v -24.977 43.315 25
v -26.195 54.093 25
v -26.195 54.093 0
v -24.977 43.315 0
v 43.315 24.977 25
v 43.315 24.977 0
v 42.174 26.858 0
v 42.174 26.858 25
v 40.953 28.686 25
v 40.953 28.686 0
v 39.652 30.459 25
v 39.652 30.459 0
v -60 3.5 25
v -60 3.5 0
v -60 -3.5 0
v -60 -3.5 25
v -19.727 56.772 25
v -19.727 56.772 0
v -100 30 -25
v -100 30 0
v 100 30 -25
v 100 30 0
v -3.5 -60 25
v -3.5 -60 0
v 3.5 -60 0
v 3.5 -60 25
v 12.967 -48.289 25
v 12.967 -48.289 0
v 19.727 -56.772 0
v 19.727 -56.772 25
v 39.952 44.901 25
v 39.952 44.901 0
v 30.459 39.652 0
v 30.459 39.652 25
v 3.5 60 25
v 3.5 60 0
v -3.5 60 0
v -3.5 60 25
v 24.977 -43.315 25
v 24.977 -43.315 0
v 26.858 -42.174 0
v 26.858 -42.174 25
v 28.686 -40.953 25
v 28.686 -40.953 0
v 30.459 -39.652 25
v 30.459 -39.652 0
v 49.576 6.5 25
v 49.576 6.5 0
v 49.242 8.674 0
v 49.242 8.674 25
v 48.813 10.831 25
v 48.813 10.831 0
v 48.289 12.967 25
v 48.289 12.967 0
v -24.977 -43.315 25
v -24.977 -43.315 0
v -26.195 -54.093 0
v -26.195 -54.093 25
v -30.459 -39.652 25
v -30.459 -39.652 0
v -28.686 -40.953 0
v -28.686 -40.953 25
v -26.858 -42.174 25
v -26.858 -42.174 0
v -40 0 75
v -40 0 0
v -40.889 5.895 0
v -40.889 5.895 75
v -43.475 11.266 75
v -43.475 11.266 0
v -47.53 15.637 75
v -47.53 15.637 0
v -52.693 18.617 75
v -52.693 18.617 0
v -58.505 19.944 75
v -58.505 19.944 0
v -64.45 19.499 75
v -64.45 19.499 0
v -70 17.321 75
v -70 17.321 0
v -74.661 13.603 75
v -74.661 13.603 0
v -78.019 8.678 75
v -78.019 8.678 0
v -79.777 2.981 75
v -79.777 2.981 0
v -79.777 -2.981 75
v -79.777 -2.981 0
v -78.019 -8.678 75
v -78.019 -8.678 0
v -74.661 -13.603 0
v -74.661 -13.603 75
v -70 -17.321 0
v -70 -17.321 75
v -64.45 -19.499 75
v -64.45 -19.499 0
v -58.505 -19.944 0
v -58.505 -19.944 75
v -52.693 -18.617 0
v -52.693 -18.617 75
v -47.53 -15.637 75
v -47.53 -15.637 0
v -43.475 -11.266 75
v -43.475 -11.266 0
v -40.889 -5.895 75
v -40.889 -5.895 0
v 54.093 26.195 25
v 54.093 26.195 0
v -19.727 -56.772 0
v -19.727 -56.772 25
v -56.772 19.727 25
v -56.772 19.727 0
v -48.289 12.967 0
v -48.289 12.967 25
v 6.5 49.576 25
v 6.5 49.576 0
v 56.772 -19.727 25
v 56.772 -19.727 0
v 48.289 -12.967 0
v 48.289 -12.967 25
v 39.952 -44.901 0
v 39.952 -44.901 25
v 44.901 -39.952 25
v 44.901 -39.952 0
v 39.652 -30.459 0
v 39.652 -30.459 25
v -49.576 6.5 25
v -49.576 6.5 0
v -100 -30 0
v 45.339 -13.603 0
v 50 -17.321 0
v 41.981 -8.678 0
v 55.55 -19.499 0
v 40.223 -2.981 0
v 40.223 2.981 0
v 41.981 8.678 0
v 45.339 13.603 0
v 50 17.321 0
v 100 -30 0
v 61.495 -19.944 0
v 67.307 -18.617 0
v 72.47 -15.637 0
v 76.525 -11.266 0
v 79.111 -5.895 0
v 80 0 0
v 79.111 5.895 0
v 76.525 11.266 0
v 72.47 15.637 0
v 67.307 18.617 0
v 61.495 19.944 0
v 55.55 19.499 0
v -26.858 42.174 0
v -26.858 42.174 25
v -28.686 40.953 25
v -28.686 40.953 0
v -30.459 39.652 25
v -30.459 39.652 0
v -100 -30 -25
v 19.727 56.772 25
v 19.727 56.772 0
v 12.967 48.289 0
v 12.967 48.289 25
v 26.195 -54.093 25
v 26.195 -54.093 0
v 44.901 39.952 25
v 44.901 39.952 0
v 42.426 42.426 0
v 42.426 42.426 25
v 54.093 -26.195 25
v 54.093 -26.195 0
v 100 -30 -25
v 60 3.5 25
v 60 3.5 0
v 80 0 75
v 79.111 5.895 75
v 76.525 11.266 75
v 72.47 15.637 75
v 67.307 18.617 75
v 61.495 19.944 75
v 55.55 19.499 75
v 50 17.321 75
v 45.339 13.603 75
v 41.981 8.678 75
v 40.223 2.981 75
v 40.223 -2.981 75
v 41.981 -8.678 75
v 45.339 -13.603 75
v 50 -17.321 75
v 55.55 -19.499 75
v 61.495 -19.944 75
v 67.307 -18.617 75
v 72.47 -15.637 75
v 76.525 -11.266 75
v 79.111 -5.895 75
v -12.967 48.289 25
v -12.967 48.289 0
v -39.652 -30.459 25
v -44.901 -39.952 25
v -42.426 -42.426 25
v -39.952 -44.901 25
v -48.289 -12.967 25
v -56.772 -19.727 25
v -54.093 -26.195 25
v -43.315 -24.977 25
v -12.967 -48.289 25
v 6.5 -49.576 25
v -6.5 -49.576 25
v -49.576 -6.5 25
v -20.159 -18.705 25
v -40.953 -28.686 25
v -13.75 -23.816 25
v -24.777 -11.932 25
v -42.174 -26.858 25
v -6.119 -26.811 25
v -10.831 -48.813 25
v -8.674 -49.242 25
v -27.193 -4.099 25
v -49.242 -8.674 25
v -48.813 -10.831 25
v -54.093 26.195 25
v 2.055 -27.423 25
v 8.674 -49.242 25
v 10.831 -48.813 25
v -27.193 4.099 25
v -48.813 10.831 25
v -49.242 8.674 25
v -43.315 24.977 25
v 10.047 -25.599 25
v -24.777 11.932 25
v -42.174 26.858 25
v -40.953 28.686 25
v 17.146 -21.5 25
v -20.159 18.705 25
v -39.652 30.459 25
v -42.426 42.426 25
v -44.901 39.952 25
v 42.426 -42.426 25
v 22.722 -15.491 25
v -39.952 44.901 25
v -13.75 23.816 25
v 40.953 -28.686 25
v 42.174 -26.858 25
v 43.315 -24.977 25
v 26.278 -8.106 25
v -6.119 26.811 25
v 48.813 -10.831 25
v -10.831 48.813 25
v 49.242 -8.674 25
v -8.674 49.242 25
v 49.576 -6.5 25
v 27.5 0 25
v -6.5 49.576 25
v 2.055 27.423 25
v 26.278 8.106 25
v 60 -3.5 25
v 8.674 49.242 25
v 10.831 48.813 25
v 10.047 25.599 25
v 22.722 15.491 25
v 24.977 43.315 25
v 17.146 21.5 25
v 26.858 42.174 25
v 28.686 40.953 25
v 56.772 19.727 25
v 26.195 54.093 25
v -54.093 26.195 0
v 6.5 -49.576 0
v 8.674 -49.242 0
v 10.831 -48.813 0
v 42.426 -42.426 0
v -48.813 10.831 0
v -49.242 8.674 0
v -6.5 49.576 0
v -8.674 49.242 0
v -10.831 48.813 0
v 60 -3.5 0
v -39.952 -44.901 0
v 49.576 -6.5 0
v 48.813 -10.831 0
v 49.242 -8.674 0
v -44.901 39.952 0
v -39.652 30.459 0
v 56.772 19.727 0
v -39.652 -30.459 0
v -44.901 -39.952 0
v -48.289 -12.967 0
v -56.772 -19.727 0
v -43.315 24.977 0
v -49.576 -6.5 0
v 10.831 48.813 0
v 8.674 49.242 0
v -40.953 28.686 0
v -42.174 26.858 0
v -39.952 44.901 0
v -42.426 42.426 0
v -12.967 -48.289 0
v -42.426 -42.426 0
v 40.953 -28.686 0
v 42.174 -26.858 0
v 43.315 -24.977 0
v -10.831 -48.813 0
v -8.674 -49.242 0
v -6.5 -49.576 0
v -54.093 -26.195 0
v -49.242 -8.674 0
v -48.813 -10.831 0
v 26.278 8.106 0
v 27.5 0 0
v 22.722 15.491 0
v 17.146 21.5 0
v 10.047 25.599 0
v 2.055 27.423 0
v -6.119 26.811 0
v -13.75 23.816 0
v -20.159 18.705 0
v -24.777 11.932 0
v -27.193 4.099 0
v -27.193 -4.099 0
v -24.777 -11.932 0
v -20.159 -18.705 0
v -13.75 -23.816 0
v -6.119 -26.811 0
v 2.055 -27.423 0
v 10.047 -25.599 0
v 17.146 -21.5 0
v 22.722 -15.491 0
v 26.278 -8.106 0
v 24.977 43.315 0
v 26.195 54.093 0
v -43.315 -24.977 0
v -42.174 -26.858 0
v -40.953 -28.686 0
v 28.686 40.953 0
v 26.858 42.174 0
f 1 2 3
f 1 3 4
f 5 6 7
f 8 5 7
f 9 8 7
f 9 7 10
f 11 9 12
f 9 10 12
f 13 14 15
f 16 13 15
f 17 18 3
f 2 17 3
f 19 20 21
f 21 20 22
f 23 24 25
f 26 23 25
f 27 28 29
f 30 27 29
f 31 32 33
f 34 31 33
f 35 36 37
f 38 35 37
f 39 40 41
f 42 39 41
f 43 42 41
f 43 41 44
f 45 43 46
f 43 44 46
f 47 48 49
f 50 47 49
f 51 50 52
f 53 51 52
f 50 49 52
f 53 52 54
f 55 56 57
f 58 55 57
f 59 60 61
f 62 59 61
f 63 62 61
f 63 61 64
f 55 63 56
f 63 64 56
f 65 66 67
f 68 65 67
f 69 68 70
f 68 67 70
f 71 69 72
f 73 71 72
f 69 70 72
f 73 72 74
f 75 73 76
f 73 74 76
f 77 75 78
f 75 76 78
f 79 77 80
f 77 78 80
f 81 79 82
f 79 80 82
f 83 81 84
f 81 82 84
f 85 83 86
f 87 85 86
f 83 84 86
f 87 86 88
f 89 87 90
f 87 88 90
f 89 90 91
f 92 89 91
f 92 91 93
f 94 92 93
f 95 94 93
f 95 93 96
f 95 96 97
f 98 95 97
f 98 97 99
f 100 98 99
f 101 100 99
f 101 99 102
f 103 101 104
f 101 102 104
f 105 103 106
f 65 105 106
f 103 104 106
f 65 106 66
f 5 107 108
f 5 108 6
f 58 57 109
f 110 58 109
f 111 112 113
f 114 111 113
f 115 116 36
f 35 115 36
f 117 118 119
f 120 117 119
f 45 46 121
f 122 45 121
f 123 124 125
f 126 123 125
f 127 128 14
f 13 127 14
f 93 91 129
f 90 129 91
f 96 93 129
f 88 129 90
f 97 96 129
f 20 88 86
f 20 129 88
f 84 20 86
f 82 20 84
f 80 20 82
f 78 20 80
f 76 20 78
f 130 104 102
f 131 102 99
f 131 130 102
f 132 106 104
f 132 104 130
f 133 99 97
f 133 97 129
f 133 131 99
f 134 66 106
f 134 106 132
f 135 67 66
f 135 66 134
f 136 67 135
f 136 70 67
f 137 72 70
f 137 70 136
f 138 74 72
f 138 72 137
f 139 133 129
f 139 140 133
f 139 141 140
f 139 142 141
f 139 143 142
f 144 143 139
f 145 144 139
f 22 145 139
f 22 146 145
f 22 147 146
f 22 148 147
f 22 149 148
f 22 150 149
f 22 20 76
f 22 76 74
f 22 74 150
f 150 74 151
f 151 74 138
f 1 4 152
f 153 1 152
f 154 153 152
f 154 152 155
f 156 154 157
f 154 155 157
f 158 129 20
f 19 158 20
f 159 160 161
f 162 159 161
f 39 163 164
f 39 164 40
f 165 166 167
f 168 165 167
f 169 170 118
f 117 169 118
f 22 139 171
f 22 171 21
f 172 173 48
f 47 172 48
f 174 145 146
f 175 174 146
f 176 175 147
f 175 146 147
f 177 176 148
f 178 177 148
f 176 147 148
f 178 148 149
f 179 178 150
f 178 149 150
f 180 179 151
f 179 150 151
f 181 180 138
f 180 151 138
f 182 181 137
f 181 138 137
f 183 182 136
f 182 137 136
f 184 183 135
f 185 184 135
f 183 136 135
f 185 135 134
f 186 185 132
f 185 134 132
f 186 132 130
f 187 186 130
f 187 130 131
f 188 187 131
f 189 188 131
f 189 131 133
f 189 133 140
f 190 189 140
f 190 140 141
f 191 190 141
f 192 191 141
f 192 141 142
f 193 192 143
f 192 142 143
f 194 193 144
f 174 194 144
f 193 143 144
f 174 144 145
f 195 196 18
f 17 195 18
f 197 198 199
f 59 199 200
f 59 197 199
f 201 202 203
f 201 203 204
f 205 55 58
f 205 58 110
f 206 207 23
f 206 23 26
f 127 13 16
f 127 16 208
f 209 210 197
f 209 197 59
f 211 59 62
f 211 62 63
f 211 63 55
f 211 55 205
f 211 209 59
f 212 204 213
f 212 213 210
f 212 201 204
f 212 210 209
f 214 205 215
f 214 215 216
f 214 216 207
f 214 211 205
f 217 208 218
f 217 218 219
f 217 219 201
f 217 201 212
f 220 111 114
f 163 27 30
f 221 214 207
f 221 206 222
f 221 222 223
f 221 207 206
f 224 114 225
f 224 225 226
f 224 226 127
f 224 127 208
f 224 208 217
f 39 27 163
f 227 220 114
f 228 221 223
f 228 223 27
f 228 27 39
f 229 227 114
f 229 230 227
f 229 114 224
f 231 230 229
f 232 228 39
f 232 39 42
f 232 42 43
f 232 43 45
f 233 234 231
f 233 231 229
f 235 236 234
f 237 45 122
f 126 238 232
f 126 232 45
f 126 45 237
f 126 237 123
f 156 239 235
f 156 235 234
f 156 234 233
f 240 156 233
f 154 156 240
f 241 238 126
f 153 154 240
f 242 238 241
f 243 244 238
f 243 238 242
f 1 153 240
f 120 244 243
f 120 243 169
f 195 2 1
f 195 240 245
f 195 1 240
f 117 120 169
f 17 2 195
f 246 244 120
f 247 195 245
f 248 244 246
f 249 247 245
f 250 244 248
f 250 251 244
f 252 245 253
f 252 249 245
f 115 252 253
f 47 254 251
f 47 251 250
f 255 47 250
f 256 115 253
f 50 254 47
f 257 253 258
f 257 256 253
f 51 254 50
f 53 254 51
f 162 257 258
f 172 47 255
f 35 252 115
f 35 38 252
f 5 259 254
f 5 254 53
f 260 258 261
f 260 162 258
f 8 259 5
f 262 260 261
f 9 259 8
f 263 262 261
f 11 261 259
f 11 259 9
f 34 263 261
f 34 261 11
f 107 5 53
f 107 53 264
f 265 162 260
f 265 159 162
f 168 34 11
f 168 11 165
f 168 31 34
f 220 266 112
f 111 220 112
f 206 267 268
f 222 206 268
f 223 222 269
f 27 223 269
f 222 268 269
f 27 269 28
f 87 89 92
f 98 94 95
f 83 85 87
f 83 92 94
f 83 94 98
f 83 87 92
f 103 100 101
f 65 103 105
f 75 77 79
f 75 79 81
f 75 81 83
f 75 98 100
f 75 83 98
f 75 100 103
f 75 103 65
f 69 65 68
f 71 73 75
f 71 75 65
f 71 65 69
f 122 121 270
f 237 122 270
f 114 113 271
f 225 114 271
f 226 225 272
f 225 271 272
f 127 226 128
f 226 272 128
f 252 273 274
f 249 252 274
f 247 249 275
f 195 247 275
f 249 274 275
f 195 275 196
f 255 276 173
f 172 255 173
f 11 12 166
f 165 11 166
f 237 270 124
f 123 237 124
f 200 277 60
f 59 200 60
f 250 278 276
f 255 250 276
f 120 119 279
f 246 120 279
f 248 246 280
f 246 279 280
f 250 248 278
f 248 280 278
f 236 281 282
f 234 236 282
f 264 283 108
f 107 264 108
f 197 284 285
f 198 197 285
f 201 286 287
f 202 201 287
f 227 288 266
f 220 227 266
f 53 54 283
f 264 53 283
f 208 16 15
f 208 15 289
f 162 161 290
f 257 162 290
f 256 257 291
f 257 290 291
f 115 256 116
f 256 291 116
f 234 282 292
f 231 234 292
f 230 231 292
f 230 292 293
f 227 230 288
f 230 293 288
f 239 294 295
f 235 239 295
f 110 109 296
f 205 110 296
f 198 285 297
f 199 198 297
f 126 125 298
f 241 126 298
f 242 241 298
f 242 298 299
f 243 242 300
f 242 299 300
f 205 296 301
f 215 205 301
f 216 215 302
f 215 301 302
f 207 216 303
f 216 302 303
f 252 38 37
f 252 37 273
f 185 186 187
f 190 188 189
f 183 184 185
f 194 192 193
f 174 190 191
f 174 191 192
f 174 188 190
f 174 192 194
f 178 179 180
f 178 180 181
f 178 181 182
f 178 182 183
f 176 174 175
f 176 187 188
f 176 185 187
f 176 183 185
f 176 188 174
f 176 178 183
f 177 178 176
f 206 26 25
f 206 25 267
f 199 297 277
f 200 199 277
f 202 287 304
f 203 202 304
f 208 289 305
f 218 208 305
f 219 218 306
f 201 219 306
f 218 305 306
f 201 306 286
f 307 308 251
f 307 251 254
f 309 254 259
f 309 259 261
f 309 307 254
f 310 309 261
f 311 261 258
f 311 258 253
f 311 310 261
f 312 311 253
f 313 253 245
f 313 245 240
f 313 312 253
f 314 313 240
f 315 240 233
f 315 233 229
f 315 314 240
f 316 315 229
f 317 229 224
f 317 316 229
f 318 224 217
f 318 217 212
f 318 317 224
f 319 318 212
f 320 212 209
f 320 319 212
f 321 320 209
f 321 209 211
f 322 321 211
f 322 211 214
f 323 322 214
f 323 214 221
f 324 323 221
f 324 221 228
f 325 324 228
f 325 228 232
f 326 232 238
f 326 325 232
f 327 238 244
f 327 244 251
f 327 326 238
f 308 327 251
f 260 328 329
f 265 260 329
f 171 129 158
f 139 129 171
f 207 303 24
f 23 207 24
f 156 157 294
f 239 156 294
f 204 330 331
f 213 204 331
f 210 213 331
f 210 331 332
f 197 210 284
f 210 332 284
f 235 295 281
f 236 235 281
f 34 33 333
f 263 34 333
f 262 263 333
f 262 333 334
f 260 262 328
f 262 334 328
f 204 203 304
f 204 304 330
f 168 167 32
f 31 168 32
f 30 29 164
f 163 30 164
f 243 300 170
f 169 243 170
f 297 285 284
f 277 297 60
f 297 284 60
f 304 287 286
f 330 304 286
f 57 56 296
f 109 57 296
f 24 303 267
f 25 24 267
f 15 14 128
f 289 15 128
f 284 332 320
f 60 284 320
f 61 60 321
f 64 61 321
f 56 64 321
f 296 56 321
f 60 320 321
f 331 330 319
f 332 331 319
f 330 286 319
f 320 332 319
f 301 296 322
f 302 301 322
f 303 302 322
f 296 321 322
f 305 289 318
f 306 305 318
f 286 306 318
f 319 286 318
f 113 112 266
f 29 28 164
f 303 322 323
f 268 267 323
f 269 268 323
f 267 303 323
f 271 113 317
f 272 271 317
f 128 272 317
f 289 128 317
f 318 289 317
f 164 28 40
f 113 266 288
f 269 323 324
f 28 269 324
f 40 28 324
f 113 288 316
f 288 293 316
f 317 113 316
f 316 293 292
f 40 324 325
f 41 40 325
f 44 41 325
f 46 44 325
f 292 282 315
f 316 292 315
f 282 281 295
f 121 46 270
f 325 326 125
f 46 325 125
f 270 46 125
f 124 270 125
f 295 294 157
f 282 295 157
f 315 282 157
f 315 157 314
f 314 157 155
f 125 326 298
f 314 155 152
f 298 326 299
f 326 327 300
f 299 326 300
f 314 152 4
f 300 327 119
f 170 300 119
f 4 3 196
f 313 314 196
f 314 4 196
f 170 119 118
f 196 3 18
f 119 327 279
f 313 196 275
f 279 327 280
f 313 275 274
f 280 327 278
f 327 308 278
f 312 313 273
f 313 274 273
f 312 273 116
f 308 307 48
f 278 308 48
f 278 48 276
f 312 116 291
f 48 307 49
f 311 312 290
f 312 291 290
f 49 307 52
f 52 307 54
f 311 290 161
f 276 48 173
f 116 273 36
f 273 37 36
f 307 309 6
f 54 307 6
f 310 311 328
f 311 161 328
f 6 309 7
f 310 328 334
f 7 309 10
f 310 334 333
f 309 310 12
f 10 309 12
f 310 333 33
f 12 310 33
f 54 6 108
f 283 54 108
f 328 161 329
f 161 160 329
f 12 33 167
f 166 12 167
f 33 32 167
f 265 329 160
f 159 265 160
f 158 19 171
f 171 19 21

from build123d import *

# Parameters (mm, degrees)
F0_R     = 27.5
F1_DEPTH = 25
F2_W     = 200
F2_H     = 60
F2_R     = 20
F3_DEPTH = 25
F4_DEPTH = 75


with BuildPart() as f1:
    # F0 (on Top) → F1 (new body)
    with BuildSketch(Plane.XY):
        with BuildLine():
            ThreePointArc((-24.9770158815, 43.3145319454), (-19.1341716183, 46.1939766256), (-12.9665819589, 48.2894165662))
            Line((-12.9665819589, 48.2894165662), (-19.7274275781, 56.772163964))
            Line((-19.7274275781, 56.772163964), (-22.9610059419, 55.4327719507))
            Line((-22.9610059419, 55.4327719507), (-26.1945843057, 54.0933799374))
            Line((-26.1945843057, 54.0933799374), (-24.9770158815, 43.3145319454))
        make_face()
        with BuildLine():
            ThreePointArc((-39.6515075123, 30.4591193569), (-35.3553390593, 35.3553390593), (-30.4591193569, 39.6515075123))
            Line((-30.4591193569, 39.6515075123), (-39.951533137, 44.9012806053))
            Line((-39.951533137, 44.9012806053), (-42.4264068712, 42.4264068712))
            Line((-42.4264068712, 42.4264068712), (-44.9012806053, 39.951533137))
            Line((-44.9012806053, 39.951533137), (-39.6515075123, 30.4591193569))
        make_face()
        with BuildLine():
            ThreePointArc((-48.2894165662, 12.9665819589), (-46.1939766256, 19.1341716183), (-43.3145319454, 24.9770158815))
            Line((-43.3145319454, 24.9770158815), (-54.0933799374, 26.1945843057))
            Line((-54.0933799374, 26.1945843057), (-55.4327719507, 22.9610059419))
            Line((-55.4327719507, 22.9610059419), (-56.772163964, 19.7274275781))
            Line((-56.772163964, 19.7274275781), (-48.2894165662, 12.9665819589))
        make_face()
        with BuildLine():
            Line((-54.0933799374, -26.1945843057), (-43.3145319454, -24.9770158815))
            ThreePointArc((-43.3145319454, -24.9770158815), (-46.1939766256, -19.1341716183), (-48.2894165662, -12.9665819589))
            Line((-48.2894165662, -12.9665819589), (-56.772163964, -19.7274275781))
            Line((-56.772163964, -19.7274275781), (-55.4327719507, -22.9610059419))
            Line((-55.4327719507, -22.9610059419), (-54.0933799374, -26.1945843057))
        make_face()
        with BuildLine():
            Line((-39.951533137, -44.9012806053), (-30.4591193569, -39.6515075123))
            ThreePointArc((-30.4591193569, -39.6515075123), (-35.3553390593, -35.3553390593), (-39.6515075123, -30.4591193569))
            Line((-39.6515075123, -30.4591193569), (-44.9012806053, -39.951533137))
            Line((-44.9012806053, -39.951533137), (-42.4264068712, -42.4264068712))
            Line((-42.4264068712, -42.4264068712), (-39.951533137, -44.9012806053))
        make_face()
        with BuildLine():
            Line((-19.7274275781, -56.772163964), (-12.9665819589, -48.2894165662))
            ThreePointArc((-12.9665819589, -48.2894165662), (-19.1341716183, -46.1939766256), (-24.9770158815, -43.3145319454))
            Line((-24.9770158815, -43.3145319454), (-26.1945843057, -54.0933799374))
            Line((-26.1945843057, -54.0933799374), (-22.9610059419, -55.4327719507))
            Line((-22.9610059419, -55.4327719507), (-19.7274275781, -56.772163964))
        make_face()
        with BuildLine():
            Line((26.1945843057, -54.0933799374), (24.9770158815, -43.3145319454))
            ThreePointArc((24.9770158815, -43.3145319454), (19.1341716183, -46.1939766256), (12.9665819589, -48.2894165662))
            Line((12.9665819589, -48.2894165662), (19.7274275781, -56.772163964))
            Line((19.7274275781, -56.772163964), (22.9610059419, -55.4327719507))
            Line((22.9610059419, -55.4327719507), (26.1945843057, -54.0933799374))
        make_face()
        with BuildLine():
            Line((44.9012806053, -39.951533137), (39.6515075123, -30.4591193569))
            ThreePointArc((39.6515075123, -30.4591193569), (35.3553390593, -35.3553390593), (30.4591193569, -39.6515075123))
            Line((30.4591193569, -39.6515075123), (39.951533137, -44.9012806053))
            Line((39.951533137, -44.9012806053), (42.4264068712, -42.4264068712))
            Line((42.4264068712, -42.4264068712), (44.9012806053, -39.951533137))
        make_face()
        with BuildLine():
            Line((56.772163964, -19.7274275781), (48.2894165662, -12.9665819589))
            ThreePointArc((48.2894165662, -12.9665819589), (46.1939766256, -19.1341716183), (43.3145319454, -24.9770158815))
            Line((43.3145319454, -24.9770158815), (54.0933799374, -26.1945843057))
            Line((54.0933799374, -26.1945843057), (55.4327719507, -22.9610059419))
            Line((55.4327719507, -22.9610059419), (56.772163964, -19.7274275781))
        make_face()
        with BuildLine():
            ThreePointArc((49.5756996925, 6.5), (49.8938121646, 3.2569168991), (50, 0))
            ThreePointArc((50, 0), (49.8938121646, -3.2569168991), (49.5756996925, -6.5))
            Line((49.5756996925, -6.5), (60, -3.5))
            Line((60, -3.5), (60, 0))
            Line((60, 0), (60, 3.5))
            Line((60, 3.5), (49.5756996925, 6.5))
        make_face()
        with BuildLine():
            ThreePointArc((43.3145319454, 24.9770158815), (46.1939766256, 19.1341716183), (48.2894165662, 12.9665819589))
            Line((48.2894165662, 12.9665819589), (56.772163964, 19.7274275781))
            Line((56.772163964, 19.7274275781), (55.4327719507, 22.9610059419))
            Line((55.4327719507, 22.9610059419), (54.0933799374, 26.1945843057))
            Line((54.0933799374, 26.1945843057), (43.3145319454, 24.9770158815))
        make_face()
        with BuildLine():
            ThreePointArc((30.4591193569, 39.6515075123), (35.3553390593, 35.3553390593), (39.6515075123, 30.4591193569))
            Line((39.6515075123, 30.4591193569), (44.9012806053, 39.951533137))
            Line((44.9012806053, 39.951533137), (42.4264068712, 42.4264068712))
            Line((42.4264068712, 42.4264068712), (39.951533137, 44.9012806053))
            Line((39.951533137, 44.9012806053), (30.4591193569, 39.6515075123))
        make_face()
        with BuildLine():
            ThreePointArc((12.9665819589, 48.2894165662), (19.1341716183, 46.1939766256), (24.9770158815, 43.3145319454))
            Line((24.9770158815, 43.3145319454), (26.1945843057, 54.0933799374))
            Line((26.1945843057, 54.0933799374), (22.9610059419, 55.4327719507))
            Line((22.9610059419, 55.4327719507), (19.7274275781, 56.772163964))
            Line((19.7274275781, 56.772163964), (12.9665819589, 48.2894165662))
        make_face()
        with BuildLine():
            ThreePointArc((-6.5, 49.5756996925), (0, 50), (6.5, 49.5756996925))
            Line((6.5, 49.5756996925), (3.5, 60))
            Line((3.5, 60), (0, 60))
            Line((0, 60), (-3.5, 60))
            Line((-3.5, 60), (-6.5, 49.5756996925))
        make_face()
        with BuildLine():
            Line((3.5, -60), (6.5, -49.5756996925))
            ThreePointArc((6.5, -49.5756996925), (0, -50), (-6.5, -49.5756996925))
            Line((-6.5, -49.5756996925), (-3.5, -60))
            Line((-3.5, -60), (0, -60))
            Line((0, -60), (3.5, -60))
        make_face()
        with BuildLine():
            ThreePointArc((-49.5756996925, -6.5), (-50, 0), (-49.5756996925, 6.5))
            Line((-49.5756996925, 6.5), (-60, 3.5))
            Line((-60, 3.5), (-60, 0))
            Line((-60, 0), (-60, -3.5))
            Line((-60, -3.5), (-49.5756996925, -6.5))
        make_face()
        with BuildLine():
            ThreePointArc((49.5756996925, -6.5), (49.8938121646, -3.2569168991), (50, 0))
            ThreePointArc((50, 0), (49.8938121646, 3.2569168991), (49.5756996925, 6.5))
            ThreePointArc((49.5756996925, 6.5), (49.0392640202, 9.7545161008), (48.2894165662, 12.9665819589))
            ThreePointArc((48.2894165662, 12.9665819589), (46.1939766256, 19.1341716183), (43.3145319454, 24.9770158815))
            ThreePointArc((43.3145319454, 24.9770158815), (41.5734806151, 27.778511651), (39.6515075123, 30.4591193569))
            ThreePointArc((39.6515075123, 30.4591193569), (35.3553390593, 35.3553390593), (30.4591193569, 39.6515075123))
            ThreePointArc((30.4591193569, 39.6515075123), (27.778511651, 41.5734806151), (24.9770158815, 43.3145319454))
            ThreePointArc((24.9770158815, 43.3145319454), (19.1341716183, 46.1939766256), (12.9665819589, 48.2894165662))
            ThreePointArc((12.9665819589, 48.2894165662), (9.7545161008, 49.0392640202), (6.5, 49.5756996925))
            ThreePointArc((6.5, 49.5756996925), (0, 50), (-6.5, 49.5756996925))
            ThreePointArc((-6.5, 49.5756996925), (-9.7545161008, 49.0392640202), (-12.9665819589, 48.2894165662))
            ThreePointArc((-12.9665819589, 48.2894165662), (-19.1341716183, 46.1939766256), (-24.9770158815, 43.3145319454))
            ThreePointArc((-24.9770158815, 43.3145319454), (-27.778511651, 41.5734806151), (-30.4591193569, 39.6515075123))
            ThreePointArc((-30.4591193569, 39.6515075123), (-35.3553390593, 35.3553390593), (-39.6515075123, 30.4591193569))
            ThreePointArc((-39.6515075123, 30.4591193569), (-41.5734806151, 27.778511651), (-43.3145319454, 24.9770158815))
            ThreePointArc((-43.3145319454, 24.9770158815), (-46.1939766256, 19.1341716183), (-48.2894165662, 12.9665819589))
            ThreePointArc((-48.2894165662, 12.9665819589), (-49.0392640202, 9.7545161008), (-49.5756996925, 6.5))
            ThreePointArc((-49.5756996925, 6.5), (-50, 0), (-49.5756996925, -6.5))
            ThreePointArc((-49.5756996925, -6.5), (-49.0392640202, -9.7545161008), (-48.2894165662, -12.9665819589))
            ThreePointArc((-48.2894165662, -12.9665819589), (-46.1939766256, -19.1341716183), (-43.3145319454, -24.9770158815))
            ThreePointArc((-43.3145319454, -24.9770158815), (-41.5734806151, -27.778511651), (-39.6515075123, -30.4591193569))
            ThreePointArc((-39.6515075123, -30.4591193569), (-35.3553390593, -35.3553390593), (-30.4591193569, -39.6515075123))
            ThreePointArc((-30.4591193569, -39.6515075123), (-27.778511651, -41.5734806151), (-24.9770158815, -43.3145319454))
            ThreePointArc((-24.9770158815, -43.3145319454), (-19.1341716183, -46.1939766256), (-12.9665819589, -48.2894165662))
            ThreePointArc((-12.9665819589, -48.2894165662), (-9.7545161008, -49.0392640202), (-6.5, -49.5756996925))
            ThreePointArc((-6.5, -49.5756996925), (0, -50), (6.5, -49.5756996925))
            ThreePointArc((6.5, -49.5756996925), (9.7545161008, -49.0392640202), (12.9665819589, -48.2894165662))
            ThreePointArc((12.9665819589, -48.2894165662), (19.1341716183, -46.1939766256), (24.9770158815, -43.3145319454))
            ThreePointArc((24.9770158815, -43.3145319454), (27.778511651, -41.5734806151), (30.4591193569, -39.6515075123))
            ThreePointArc((30.4591193569, -39.6515075123), (35.3553390593, -35.3553390593), (39.6515075123, -30.4591193569))
            ThreePointArc((39.6515075123, -30.4591193569), (41.5734806151, -27.778511651), (43.3145319454, -24.9770158815))
            ThreePointArc((43.3145319454, -24.9770158815), (46.1939766256, -19.1341716183), (48.2894165662, -12.9665819589))
            ThreePointArc((48.2894165662, -12.9665819589), (49.0392640202, -9.7545161008), (49.5756996925, -6.5))
        make_face()
        Circle(F0_R, mode=Mode.SUBTRACT)
    extrude(amount=F1_DEPTH)


with BuildPart() as f3:
    # F2 (on Top) → F3 (new body)
    with BuildSketch(Plane.XY):
        Rectangle(F2_W, F2_H)
        with Locations((-60, 0)):
            Circle(F2_R, mode=Mode.SUBTRACT)
        with Locations((60, 0)):
            Circle(F2_R, mode=Mode.SUBTRACT)
        with Locations((-60, 0)):
            Circle(F2_R)
        with Locations((60, 0)):
            Circle(F2_R)
    extrude(amount=-F3_DEPTH)

    # F2 (on Top) → F4 (join)
    with BuildSketch(Plane.XY):
        with Locations((60, 0)):
            Circle(F2_R)
        with Locations((-60, 0)):
            Circle(F2_R)
    extrude(amount=F4_DEPTH)


solid = Compound([f1.part, f3.part])
